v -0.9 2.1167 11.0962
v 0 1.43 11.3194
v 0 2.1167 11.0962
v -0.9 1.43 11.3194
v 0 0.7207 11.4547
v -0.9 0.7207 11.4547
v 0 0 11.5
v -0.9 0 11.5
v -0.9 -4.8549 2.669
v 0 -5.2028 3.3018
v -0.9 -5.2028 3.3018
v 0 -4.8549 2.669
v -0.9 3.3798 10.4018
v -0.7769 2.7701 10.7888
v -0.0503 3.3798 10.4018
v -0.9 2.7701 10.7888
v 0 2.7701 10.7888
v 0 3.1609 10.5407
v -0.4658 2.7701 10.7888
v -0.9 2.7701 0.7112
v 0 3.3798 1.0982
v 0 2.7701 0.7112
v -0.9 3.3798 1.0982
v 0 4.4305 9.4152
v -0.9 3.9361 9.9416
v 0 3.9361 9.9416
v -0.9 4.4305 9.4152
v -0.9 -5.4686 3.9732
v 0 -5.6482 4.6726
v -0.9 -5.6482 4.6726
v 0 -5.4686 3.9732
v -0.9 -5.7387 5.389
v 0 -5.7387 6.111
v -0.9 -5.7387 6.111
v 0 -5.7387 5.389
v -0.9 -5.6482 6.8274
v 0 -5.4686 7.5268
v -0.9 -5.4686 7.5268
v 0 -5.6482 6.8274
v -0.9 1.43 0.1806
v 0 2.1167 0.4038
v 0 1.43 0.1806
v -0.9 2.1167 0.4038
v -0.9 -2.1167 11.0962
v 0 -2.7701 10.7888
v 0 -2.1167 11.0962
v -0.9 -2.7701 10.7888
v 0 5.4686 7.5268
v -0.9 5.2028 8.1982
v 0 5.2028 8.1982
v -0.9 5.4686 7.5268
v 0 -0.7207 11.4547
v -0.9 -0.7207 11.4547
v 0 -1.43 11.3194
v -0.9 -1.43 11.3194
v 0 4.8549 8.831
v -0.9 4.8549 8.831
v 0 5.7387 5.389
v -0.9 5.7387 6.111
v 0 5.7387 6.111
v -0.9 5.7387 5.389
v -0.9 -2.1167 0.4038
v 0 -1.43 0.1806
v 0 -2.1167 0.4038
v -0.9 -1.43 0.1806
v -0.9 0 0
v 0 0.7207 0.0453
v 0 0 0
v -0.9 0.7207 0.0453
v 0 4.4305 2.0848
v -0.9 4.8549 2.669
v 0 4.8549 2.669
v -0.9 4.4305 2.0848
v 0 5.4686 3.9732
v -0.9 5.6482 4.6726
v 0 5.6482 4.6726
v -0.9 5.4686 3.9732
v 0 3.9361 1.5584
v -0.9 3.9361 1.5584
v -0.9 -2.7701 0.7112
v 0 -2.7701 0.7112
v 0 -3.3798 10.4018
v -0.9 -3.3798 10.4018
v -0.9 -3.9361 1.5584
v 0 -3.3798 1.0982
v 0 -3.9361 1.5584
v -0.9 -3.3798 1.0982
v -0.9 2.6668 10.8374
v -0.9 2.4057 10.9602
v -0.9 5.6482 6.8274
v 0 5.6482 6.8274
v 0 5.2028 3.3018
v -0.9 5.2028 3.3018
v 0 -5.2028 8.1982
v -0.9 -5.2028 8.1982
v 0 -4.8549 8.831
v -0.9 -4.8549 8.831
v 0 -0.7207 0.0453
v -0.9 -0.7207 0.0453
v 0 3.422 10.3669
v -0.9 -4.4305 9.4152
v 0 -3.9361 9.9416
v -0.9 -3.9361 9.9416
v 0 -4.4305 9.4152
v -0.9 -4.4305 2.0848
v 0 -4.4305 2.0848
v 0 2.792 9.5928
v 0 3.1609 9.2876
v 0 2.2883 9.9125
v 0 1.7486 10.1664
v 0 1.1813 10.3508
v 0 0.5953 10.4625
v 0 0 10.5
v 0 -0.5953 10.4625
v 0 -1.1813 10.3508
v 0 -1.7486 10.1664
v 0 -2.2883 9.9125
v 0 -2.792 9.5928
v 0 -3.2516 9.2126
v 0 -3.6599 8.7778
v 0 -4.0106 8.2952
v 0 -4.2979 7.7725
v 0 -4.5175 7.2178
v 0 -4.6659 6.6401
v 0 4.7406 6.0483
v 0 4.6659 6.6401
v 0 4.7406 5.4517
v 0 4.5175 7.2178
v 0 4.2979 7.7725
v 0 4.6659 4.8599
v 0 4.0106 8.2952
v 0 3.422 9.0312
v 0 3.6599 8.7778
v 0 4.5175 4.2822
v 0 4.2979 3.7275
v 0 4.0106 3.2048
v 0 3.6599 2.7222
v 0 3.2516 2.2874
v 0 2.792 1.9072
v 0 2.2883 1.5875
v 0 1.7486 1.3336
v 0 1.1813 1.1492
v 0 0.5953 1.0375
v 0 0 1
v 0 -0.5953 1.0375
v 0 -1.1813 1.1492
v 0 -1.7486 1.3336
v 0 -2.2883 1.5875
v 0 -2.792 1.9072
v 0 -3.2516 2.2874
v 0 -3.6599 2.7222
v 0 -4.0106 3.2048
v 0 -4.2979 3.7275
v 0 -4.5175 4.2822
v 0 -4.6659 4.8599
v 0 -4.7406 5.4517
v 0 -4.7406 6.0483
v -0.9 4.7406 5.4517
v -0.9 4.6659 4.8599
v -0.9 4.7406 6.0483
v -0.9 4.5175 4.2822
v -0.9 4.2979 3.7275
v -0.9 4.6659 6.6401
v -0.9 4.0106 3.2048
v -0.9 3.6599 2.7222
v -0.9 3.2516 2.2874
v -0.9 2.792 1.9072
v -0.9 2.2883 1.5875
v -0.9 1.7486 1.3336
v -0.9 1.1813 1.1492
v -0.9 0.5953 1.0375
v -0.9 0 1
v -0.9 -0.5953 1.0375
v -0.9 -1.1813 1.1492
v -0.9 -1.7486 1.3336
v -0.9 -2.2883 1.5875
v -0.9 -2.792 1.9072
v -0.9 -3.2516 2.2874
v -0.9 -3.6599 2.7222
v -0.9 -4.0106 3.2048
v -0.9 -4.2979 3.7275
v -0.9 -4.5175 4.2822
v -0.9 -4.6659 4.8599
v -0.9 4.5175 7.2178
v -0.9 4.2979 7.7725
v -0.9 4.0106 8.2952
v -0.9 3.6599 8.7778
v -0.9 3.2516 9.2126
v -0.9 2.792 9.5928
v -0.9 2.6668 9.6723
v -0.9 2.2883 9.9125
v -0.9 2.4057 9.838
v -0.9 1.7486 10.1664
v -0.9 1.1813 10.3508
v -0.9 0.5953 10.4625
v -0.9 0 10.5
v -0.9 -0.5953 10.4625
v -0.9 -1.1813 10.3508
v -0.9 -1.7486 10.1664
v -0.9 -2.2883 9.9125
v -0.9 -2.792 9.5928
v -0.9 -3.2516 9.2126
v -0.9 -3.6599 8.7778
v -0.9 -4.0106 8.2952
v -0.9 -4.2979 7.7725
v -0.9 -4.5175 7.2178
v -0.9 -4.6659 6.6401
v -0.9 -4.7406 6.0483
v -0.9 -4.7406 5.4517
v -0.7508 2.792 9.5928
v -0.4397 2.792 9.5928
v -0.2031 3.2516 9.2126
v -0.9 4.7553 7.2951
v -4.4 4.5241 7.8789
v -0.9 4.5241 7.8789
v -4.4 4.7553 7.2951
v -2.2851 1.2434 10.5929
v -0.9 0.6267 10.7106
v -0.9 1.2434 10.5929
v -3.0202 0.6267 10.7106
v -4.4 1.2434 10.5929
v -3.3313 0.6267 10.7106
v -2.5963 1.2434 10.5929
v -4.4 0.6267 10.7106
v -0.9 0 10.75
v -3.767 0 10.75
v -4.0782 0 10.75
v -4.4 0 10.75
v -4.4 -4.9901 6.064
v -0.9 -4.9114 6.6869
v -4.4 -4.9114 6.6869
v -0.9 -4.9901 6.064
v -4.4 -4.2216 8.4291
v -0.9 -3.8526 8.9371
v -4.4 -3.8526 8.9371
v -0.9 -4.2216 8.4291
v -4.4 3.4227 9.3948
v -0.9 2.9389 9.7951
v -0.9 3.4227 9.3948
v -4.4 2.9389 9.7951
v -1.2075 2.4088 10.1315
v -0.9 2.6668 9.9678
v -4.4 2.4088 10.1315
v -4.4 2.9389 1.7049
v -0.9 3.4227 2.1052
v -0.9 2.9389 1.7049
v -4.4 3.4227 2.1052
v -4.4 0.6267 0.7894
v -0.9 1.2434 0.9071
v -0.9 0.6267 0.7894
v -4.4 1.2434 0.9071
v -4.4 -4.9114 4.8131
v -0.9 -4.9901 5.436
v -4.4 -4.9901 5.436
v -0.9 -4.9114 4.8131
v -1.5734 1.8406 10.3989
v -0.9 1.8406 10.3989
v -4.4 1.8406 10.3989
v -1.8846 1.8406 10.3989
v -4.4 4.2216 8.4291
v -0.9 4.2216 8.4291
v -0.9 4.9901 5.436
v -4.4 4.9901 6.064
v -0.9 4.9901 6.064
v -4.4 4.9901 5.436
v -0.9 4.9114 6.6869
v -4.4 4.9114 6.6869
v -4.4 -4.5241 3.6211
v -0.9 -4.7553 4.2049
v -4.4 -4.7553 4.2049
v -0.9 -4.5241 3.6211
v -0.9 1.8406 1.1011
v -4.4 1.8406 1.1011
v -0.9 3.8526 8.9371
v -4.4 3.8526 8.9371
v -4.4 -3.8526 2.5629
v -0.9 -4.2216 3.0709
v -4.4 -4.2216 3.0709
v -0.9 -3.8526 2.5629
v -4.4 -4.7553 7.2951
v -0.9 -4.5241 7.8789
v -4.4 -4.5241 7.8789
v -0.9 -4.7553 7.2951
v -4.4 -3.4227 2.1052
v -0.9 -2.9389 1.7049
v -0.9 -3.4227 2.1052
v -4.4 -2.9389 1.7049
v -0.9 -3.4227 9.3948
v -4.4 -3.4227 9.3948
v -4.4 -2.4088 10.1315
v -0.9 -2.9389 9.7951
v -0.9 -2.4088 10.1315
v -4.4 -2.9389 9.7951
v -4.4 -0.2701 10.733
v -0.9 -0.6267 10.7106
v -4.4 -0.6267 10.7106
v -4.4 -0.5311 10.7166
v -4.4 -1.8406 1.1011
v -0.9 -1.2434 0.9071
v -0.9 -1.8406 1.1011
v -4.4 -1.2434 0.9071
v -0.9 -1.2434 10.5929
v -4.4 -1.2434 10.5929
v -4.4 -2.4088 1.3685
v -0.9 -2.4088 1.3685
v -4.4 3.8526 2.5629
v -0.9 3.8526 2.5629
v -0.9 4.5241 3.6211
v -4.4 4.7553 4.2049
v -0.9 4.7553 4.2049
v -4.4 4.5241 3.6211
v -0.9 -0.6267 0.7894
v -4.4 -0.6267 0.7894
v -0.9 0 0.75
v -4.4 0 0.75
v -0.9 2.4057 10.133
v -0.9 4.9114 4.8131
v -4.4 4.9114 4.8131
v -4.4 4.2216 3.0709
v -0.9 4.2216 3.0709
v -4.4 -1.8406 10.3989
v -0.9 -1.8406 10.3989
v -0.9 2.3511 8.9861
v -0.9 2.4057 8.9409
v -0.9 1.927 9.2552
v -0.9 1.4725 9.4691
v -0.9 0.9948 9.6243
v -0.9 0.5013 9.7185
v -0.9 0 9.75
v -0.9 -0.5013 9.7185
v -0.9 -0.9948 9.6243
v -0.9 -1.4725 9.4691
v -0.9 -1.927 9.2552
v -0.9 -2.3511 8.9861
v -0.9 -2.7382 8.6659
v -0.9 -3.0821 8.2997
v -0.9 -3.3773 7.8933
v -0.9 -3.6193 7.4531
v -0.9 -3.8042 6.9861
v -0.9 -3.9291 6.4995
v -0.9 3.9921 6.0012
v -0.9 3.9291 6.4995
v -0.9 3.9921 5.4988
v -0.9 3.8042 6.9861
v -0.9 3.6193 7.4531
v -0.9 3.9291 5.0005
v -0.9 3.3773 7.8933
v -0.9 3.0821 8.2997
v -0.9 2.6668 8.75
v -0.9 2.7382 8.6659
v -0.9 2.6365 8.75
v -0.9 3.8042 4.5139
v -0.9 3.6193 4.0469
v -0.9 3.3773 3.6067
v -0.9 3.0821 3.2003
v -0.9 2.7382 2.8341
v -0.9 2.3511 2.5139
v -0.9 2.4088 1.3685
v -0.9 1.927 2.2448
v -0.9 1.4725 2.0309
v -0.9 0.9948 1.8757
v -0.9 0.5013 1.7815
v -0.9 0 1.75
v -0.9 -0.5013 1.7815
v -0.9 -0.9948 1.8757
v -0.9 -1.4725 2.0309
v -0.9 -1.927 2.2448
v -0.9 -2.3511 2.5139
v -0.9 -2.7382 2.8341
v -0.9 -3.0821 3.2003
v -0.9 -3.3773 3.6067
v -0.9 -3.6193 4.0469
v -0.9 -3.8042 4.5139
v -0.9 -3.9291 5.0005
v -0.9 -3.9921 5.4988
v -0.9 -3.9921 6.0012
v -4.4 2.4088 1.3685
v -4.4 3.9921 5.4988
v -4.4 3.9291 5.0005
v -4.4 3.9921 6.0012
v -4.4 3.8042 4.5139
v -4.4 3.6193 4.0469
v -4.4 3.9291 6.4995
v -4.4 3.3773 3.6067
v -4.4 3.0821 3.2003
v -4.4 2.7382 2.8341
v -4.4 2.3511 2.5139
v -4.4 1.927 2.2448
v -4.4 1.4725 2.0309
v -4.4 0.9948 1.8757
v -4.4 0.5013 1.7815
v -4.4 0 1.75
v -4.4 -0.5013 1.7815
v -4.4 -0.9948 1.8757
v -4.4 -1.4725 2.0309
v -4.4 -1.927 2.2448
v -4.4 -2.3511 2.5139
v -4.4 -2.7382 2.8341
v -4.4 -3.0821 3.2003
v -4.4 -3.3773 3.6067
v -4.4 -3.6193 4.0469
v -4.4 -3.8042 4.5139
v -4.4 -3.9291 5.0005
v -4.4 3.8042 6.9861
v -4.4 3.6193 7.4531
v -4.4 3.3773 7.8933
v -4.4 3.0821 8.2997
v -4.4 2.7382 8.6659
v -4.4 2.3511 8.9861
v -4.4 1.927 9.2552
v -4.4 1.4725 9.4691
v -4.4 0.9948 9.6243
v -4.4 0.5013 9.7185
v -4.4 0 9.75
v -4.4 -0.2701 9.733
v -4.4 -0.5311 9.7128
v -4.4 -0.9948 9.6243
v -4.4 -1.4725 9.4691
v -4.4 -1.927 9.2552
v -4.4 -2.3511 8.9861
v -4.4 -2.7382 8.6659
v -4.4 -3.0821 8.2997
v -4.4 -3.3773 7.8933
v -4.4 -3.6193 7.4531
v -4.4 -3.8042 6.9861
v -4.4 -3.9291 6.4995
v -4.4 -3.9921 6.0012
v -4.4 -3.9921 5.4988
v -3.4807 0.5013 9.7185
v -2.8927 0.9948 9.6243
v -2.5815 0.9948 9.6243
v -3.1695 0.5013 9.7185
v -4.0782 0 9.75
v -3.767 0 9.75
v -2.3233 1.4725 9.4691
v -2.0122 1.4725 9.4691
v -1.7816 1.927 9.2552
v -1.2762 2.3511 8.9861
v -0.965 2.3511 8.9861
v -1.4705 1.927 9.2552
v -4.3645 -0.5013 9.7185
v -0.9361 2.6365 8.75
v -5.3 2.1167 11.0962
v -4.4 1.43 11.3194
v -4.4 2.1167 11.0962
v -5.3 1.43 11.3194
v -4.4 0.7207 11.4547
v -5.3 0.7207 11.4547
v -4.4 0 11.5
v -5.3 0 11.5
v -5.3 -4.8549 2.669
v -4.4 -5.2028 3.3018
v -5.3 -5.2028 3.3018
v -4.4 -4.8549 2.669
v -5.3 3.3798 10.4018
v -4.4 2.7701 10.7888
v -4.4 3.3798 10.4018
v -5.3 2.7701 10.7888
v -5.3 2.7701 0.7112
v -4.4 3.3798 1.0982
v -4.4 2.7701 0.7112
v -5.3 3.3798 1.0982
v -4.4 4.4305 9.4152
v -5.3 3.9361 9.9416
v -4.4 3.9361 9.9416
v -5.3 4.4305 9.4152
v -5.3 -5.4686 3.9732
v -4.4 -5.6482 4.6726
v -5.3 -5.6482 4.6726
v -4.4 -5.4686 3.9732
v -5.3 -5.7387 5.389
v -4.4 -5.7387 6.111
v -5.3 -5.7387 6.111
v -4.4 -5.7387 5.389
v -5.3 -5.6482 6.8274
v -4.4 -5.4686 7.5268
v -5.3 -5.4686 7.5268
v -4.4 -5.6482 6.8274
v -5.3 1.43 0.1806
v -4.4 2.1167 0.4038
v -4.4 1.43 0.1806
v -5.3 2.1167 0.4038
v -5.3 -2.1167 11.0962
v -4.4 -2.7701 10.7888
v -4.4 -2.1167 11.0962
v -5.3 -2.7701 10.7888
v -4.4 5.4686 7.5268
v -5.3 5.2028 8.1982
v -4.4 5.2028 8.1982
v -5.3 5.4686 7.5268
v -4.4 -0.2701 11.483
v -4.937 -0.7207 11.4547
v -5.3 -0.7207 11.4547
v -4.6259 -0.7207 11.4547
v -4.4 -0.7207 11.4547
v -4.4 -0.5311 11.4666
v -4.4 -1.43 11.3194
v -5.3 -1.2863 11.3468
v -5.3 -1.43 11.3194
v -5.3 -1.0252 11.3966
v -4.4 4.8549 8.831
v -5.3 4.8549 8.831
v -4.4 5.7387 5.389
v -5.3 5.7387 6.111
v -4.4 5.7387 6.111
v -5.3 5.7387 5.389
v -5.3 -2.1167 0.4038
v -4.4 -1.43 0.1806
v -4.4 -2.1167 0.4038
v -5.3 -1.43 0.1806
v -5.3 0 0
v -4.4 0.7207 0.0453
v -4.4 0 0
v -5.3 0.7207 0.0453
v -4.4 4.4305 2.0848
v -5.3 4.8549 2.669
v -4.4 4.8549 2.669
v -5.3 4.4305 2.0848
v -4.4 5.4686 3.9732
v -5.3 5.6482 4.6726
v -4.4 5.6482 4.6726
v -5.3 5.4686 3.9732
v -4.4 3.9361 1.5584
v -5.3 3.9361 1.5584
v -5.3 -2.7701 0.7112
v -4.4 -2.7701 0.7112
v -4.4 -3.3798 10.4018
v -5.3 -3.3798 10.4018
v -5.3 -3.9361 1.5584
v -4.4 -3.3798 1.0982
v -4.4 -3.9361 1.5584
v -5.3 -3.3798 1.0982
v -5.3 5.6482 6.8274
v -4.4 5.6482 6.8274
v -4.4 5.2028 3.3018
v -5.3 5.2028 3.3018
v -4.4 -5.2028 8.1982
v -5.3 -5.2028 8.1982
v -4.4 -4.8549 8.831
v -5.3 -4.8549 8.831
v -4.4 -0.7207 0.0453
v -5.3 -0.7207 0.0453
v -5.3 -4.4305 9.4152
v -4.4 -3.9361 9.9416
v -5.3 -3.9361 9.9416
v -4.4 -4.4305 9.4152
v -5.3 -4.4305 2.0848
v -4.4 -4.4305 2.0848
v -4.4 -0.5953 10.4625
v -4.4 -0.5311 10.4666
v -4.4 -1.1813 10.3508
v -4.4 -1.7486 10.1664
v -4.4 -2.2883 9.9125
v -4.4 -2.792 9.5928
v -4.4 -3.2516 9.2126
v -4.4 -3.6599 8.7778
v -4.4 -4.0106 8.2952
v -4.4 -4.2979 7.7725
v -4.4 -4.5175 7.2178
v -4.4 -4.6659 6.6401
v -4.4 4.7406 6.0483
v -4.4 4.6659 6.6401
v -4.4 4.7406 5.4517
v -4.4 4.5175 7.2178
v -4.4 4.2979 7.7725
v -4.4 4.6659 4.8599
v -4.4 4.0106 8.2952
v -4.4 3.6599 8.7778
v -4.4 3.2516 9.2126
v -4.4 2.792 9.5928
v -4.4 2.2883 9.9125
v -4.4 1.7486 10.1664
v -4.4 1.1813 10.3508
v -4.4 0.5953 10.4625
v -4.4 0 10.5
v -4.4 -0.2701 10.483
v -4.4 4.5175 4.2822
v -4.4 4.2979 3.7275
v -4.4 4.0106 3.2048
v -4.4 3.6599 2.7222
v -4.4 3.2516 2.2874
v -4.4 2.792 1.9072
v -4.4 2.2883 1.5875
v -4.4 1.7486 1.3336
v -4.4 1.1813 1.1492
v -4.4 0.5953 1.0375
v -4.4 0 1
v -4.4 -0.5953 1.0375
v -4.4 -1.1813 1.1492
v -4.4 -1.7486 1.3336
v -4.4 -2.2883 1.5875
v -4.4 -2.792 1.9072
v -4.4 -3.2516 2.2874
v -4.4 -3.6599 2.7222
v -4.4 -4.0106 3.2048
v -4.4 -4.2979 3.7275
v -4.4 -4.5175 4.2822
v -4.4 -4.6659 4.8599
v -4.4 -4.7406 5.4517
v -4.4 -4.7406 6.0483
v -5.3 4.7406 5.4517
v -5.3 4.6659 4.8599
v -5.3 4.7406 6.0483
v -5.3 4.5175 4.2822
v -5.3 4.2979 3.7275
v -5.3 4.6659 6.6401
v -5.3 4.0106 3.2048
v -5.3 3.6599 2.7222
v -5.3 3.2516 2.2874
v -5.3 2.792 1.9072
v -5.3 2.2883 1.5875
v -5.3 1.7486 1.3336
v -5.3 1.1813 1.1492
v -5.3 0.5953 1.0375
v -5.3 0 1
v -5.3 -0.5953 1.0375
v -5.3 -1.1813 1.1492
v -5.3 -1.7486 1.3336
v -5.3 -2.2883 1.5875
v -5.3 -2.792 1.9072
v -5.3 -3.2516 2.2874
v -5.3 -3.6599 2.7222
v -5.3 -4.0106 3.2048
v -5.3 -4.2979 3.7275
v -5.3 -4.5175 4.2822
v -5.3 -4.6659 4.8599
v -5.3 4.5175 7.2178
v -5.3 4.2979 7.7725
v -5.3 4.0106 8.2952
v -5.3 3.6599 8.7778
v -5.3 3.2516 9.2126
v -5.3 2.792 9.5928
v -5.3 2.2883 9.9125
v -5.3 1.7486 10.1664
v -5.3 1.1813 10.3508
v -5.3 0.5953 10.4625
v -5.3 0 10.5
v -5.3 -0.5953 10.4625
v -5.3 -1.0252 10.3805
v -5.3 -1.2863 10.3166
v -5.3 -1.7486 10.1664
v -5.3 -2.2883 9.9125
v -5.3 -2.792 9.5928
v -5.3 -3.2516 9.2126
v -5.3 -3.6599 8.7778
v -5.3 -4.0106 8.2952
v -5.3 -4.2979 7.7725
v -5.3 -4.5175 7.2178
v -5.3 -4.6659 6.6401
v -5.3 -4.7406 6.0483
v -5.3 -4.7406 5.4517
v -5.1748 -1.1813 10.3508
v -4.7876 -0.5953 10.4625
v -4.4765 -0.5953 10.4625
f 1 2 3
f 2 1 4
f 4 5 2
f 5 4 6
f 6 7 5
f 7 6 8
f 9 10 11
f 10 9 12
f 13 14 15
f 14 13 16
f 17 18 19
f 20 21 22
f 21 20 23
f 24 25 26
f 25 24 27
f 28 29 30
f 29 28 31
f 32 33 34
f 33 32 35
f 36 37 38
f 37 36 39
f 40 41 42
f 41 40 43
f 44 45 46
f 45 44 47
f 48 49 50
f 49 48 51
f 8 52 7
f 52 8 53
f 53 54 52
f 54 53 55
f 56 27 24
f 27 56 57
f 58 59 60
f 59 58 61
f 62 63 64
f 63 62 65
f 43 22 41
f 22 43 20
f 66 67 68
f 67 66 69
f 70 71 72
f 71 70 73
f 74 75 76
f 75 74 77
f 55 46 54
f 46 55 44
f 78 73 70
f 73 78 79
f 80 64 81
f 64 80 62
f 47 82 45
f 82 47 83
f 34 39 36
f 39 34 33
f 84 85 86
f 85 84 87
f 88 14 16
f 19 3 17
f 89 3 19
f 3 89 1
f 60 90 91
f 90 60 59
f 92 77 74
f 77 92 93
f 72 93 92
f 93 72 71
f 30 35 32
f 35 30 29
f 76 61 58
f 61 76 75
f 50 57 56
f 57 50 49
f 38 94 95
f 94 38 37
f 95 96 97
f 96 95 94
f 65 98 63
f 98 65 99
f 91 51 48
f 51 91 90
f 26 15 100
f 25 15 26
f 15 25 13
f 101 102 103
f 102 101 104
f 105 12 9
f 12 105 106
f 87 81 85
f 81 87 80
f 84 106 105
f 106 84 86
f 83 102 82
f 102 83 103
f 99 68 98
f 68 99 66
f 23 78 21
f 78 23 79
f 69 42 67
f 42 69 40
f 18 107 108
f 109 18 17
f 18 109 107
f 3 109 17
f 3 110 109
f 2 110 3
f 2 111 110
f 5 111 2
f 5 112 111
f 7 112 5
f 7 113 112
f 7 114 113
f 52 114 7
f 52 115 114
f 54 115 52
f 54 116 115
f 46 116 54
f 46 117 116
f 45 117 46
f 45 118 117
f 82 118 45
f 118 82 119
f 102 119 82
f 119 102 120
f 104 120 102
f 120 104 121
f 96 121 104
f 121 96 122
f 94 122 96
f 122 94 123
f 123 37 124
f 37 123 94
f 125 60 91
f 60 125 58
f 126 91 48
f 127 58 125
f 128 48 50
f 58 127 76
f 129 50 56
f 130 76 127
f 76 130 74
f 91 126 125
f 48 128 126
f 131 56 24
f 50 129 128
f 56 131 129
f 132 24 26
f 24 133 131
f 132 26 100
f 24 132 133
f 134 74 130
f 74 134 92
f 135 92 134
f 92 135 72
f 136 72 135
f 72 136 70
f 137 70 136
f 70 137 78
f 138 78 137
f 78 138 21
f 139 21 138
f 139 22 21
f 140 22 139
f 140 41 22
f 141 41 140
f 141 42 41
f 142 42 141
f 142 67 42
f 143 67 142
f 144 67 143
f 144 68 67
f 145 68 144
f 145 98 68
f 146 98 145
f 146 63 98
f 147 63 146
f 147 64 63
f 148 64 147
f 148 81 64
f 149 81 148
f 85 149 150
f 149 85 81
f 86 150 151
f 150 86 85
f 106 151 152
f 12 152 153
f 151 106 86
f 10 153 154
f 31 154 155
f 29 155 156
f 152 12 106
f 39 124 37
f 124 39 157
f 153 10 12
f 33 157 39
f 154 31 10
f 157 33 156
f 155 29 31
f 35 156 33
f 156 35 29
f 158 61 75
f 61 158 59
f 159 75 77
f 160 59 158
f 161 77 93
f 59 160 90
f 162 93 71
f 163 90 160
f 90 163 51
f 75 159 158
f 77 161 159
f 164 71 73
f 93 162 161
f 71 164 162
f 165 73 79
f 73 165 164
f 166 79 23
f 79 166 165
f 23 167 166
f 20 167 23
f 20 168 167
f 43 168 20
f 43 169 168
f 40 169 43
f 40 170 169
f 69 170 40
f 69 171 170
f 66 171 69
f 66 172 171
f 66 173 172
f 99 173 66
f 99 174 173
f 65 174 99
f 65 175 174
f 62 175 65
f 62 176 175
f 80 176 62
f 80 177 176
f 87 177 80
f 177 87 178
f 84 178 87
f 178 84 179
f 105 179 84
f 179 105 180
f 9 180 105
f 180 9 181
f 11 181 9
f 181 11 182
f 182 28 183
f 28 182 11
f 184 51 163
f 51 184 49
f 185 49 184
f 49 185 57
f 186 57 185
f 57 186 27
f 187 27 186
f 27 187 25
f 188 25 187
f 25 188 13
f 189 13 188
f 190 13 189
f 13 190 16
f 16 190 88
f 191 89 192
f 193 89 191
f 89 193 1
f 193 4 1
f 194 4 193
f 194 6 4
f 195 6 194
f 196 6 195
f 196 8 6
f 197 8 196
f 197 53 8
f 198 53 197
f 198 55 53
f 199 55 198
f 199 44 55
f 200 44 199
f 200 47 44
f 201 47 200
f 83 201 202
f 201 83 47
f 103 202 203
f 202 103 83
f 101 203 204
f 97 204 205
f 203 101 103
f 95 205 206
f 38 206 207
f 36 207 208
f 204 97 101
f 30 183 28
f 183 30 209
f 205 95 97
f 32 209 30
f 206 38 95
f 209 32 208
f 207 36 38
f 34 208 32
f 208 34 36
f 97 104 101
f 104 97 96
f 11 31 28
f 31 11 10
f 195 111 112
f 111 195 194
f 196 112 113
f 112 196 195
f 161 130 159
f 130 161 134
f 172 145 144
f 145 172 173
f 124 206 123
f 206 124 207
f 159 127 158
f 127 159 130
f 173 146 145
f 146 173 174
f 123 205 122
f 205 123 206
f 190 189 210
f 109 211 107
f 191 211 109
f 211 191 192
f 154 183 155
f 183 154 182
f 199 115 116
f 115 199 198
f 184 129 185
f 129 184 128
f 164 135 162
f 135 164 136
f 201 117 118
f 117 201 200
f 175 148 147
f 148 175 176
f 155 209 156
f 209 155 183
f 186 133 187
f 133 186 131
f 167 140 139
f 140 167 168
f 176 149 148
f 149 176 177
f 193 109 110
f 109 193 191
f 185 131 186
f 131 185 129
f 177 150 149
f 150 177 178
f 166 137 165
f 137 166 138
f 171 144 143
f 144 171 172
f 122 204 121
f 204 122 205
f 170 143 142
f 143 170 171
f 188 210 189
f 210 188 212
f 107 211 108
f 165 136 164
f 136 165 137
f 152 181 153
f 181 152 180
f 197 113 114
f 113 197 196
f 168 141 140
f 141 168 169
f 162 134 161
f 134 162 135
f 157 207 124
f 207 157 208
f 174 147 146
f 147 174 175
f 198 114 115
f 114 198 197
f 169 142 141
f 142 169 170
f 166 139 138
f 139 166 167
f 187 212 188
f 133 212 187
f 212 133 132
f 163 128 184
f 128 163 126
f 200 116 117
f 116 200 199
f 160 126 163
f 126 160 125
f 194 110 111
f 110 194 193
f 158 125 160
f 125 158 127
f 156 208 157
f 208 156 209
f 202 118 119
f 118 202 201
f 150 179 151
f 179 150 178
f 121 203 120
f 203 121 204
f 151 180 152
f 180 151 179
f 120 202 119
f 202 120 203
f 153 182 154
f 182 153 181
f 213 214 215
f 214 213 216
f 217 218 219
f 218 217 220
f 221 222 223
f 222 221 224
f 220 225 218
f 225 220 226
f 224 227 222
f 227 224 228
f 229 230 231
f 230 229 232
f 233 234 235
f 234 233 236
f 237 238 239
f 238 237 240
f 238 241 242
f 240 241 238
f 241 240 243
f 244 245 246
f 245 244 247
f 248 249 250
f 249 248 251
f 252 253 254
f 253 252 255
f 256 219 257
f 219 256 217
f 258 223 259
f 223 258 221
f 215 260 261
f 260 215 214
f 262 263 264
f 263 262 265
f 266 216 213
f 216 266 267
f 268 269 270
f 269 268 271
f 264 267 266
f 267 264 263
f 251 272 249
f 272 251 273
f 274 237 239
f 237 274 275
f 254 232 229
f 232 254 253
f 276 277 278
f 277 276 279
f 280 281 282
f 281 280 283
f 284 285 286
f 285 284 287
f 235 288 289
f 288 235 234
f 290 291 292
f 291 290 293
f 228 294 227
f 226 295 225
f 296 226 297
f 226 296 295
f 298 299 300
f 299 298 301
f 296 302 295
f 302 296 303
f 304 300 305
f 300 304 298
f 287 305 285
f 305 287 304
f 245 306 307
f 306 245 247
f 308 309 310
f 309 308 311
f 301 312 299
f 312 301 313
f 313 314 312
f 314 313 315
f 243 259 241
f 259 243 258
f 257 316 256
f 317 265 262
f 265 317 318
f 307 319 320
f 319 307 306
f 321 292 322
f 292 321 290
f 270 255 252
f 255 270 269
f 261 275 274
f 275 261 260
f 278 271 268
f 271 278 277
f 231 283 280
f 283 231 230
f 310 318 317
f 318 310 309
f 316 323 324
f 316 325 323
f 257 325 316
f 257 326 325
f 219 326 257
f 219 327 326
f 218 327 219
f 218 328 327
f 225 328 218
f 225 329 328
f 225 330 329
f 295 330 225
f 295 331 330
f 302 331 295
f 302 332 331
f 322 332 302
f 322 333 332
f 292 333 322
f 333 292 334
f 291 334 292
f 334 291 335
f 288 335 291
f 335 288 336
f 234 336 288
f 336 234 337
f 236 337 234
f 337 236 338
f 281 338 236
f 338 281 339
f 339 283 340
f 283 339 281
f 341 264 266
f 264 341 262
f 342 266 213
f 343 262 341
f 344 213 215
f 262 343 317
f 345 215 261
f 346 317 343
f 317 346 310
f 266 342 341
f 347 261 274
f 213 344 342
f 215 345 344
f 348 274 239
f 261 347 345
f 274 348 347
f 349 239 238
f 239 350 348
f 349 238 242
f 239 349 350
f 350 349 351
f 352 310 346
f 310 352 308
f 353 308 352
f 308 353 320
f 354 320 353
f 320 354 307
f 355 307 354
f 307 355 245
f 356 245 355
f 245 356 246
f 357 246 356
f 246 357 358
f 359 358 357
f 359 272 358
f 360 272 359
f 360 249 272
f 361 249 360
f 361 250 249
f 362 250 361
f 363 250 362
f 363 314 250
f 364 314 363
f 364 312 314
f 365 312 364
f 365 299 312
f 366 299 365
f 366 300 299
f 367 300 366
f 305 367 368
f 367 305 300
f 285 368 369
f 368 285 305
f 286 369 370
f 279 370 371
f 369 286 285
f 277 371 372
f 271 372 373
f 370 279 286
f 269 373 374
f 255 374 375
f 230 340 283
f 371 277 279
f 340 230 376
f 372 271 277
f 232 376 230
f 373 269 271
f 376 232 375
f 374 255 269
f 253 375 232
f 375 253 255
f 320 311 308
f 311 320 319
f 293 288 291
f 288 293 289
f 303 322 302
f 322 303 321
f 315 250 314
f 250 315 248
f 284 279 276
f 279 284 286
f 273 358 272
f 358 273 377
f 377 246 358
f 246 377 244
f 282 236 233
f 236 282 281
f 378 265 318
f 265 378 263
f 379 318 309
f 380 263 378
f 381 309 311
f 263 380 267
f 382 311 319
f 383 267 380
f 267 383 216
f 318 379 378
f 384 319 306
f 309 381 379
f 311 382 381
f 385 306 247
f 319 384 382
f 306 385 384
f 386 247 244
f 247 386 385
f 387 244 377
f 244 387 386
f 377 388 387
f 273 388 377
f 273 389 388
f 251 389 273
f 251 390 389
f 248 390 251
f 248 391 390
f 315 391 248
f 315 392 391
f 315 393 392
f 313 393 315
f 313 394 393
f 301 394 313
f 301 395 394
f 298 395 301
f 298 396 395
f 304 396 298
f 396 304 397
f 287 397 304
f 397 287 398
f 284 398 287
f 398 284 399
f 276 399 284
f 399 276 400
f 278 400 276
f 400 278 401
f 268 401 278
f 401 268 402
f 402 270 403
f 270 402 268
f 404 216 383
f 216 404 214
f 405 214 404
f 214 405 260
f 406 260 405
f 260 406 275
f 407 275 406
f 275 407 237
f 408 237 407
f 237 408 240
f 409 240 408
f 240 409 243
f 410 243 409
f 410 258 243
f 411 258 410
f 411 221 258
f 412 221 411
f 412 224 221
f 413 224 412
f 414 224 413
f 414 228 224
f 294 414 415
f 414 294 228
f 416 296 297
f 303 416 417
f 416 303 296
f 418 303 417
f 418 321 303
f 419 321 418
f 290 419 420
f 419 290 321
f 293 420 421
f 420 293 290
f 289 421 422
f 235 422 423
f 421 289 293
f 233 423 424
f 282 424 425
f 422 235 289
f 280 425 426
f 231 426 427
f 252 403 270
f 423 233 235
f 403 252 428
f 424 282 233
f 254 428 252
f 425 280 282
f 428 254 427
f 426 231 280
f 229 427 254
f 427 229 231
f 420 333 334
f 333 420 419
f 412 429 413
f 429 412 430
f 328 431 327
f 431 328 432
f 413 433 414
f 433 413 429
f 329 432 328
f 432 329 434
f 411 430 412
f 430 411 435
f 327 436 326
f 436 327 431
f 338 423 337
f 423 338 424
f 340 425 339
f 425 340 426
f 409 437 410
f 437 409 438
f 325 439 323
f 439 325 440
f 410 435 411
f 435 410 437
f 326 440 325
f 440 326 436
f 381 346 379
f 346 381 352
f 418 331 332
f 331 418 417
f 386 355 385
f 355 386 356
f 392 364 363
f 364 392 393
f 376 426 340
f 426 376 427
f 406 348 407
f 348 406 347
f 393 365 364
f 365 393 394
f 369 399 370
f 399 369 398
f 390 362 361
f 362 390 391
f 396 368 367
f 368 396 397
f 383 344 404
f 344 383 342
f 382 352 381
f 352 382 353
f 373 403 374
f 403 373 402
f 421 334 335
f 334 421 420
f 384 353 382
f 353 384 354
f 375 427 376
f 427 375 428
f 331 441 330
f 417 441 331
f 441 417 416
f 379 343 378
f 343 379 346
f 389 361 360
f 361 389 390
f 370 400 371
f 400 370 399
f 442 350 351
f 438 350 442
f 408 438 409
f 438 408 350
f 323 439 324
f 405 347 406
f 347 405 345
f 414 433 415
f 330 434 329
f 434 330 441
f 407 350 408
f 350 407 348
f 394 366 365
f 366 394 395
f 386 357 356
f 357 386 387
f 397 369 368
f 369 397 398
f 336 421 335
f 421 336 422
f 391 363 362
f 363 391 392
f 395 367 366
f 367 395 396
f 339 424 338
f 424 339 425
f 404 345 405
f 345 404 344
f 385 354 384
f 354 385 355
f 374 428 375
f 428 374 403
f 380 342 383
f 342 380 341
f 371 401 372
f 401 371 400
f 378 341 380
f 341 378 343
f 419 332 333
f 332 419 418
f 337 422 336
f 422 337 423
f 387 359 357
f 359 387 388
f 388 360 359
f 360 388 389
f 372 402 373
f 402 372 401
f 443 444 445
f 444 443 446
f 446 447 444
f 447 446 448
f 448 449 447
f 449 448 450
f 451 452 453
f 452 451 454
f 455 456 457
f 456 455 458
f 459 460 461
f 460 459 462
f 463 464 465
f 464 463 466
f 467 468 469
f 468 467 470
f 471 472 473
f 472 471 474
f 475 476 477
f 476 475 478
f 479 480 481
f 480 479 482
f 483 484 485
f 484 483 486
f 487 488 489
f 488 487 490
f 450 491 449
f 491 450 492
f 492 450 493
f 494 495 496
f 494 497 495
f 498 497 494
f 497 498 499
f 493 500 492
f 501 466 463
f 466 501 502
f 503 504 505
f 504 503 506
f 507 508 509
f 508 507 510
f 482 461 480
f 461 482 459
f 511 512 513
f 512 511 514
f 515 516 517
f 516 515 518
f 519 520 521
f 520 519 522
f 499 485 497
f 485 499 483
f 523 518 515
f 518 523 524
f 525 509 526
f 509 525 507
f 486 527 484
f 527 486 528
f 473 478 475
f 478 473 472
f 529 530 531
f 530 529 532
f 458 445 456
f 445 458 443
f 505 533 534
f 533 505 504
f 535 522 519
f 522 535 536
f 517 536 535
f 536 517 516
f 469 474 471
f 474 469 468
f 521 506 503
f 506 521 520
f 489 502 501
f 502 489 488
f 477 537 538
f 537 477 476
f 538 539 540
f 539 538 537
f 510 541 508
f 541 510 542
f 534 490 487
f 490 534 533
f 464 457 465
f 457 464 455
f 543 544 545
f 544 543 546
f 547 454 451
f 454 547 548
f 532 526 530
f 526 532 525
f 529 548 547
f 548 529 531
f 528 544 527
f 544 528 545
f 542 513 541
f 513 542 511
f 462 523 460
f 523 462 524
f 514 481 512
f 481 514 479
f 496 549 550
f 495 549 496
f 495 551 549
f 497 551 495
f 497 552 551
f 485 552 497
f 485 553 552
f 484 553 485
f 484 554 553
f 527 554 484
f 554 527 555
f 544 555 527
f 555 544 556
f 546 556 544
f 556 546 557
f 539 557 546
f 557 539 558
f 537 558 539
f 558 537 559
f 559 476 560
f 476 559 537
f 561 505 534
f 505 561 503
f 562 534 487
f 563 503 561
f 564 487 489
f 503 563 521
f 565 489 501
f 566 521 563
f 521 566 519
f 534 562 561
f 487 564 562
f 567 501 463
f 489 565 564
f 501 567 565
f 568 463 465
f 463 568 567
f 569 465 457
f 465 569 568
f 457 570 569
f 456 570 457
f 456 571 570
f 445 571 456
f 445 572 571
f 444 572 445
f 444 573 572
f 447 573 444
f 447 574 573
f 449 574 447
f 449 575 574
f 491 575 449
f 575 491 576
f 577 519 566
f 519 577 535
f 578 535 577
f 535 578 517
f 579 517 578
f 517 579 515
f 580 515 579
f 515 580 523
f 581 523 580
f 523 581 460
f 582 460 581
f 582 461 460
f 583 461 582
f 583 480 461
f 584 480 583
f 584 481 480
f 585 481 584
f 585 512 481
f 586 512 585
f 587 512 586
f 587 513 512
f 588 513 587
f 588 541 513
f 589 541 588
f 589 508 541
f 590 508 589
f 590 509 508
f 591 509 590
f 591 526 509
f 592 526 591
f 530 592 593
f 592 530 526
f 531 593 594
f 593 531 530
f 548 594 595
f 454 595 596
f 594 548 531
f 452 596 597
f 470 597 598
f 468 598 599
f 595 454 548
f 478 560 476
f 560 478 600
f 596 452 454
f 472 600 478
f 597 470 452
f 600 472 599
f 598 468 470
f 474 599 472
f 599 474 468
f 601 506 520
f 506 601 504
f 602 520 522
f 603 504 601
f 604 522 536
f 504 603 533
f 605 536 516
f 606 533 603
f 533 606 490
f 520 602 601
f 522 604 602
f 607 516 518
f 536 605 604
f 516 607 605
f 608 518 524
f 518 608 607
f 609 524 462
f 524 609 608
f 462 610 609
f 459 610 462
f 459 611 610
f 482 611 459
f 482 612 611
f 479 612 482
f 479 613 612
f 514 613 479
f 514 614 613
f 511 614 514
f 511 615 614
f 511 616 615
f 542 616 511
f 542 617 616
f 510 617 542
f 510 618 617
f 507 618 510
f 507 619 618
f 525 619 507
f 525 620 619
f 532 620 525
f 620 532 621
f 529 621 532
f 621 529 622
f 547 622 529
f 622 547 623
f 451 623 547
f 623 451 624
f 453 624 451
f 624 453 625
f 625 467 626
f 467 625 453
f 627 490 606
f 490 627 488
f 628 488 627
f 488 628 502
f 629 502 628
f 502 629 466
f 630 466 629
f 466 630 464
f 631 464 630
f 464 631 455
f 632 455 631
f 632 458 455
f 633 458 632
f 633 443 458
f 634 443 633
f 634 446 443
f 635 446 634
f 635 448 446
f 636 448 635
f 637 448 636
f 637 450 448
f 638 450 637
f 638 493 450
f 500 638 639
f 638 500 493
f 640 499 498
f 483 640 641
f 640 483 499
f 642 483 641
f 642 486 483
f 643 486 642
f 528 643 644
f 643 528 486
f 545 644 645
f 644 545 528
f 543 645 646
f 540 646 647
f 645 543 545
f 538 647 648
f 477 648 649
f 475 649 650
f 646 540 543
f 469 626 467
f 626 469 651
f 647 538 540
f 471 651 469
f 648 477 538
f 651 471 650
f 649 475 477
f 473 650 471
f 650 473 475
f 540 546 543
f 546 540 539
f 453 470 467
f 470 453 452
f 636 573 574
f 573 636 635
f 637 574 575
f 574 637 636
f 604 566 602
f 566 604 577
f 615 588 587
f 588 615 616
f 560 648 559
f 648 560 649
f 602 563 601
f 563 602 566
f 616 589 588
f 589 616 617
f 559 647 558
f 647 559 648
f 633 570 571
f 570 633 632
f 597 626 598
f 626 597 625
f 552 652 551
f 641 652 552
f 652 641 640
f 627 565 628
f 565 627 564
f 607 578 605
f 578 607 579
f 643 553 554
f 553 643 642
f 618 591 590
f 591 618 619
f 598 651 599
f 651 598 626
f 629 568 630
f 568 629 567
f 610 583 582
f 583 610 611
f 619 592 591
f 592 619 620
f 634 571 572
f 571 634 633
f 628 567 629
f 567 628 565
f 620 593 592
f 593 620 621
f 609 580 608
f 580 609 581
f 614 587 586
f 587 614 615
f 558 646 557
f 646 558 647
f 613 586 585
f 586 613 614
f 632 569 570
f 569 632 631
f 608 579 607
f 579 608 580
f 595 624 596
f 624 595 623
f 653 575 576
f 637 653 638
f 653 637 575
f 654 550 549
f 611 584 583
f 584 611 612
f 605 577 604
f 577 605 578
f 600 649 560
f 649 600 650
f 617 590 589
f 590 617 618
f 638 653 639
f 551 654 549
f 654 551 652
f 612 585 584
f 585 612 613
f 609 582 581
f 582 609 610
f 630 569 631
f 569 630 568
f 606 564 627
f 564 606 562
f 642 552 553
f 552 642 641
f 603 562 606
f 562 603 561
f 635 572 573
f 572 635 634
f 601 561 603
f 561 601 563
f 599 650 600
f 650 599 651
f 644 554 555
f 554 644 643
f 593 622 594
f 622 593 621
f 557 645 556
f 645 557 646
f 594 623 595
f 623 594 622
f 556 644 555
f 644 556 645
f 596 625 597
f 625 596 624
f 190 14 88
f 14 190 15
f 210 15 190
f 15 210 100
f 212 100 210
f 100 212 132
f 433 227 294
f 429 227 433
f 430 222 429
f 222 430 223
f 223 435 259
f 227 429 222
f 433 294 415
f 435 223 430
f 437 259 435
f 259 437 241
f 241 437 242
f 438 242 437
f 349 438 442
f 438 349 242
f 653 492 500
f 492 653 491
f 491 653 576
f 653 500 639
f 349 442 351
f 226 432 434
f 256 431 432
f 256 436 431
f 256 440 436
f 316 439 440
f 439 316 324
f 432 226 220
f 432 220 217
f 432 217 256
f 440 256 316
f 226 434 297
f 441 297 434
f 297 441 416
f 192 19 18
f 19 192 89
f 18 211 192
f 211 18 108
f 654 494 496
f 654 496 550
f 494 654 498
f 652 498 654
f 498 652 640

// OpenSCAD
$fn=50;

width = 5.3;
lipwidth = .9;
id = 4;
lipid = 4.75;
thickness = 1;


module lip(){
difference (){
cylinder (lipwidth,lipid+thickness,lipid+thickness);
    translate([0,0,-.5])
cylinder(lipwidth+1,lipid,lipid);
};
};
module body(){
difference (){
cylinder (width-lipwidth-lipwidth,id+thickness,id+thickness);
    translate([0,0,-.5])
cylinder(width+1,id,id);
};
};

module all(){
lip();
translate([0,0,lipwidth])body();
translate([0,0,width-lipwidth])lip();
};
module a(){
difference(){ all();
    translate([3,4,-1])
    rotate([40,0,0])
cube([18,.2,20]);
};};
translate([0,0,lipid+thickness])rotate([0,-90,0])a();

module arm(){
difference(){
    color("red")cylinder(width-lipwidth-.05,lipid+thickness+1.5,lipid+thickness);
    translate([0,0,-1])cylinder(width+2,id+thickness+.1,id+thickness+.1);
    translate([0,0,-.1])cylinder (width-lipwidth-.65,lipid+thickness+.5,lipid+thickness-.5);
   translate ([0,0,width-lipwidth-.76])color("white")cylinder(.75,lipid+thickness-.5,id+thickness+.1);
   rotate([0,10,0])translate([.4,-15,-.1])cube([15,30,15]);
   rotate([0,-10,0])translate([-15.4,-15,-.1])cube([15,30,15]);
    
};};
//difference(){
//  cylinder(.2,lipid+thickness+1.5,lipid+thickness+1.5);
//    translate([0,0,-.1])
//  cylinder(.4,lipid+thickness+.5,lipid+thickness+.5);
//    
//};
//arm();
////rotate(15)arm();
//rotate(30)arm();
////rotate(45)arm();
//rotate(60)arm();
////rotate(75)arm();
//rotate(90)arm();
////rotate(105)arm();
//rotate(120)arm();
////rotate(135)arm();
//rotate(150)arm();
////rotate(165)arm();
